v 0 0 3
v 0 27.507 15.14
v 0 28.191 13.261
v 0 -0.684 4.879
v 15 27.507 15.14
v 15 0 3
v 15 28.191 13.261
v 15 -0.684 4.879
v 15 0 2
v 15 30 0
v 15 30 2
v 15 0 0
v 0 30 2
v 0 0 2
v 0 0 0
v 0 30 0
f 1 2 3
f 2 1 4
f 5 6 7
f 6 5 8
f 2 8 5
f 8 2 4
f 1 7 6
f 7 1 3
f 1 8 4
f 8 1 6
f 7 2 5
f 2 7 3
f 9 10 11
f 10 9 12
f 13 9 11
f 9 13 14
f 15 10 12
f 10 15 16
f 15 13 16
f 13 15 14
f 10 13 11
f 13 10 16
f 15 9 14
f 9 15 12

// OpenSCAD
// Create the upper plate
module lowerPlate()
    cube([15,30,2]);
module upperPlate()
    translate([0,0,3])
        rotate([20,0,0])
            lowerPlate();
            
lowerPlate();
upperPlate();





// Join the two plates at the edge
difference() {
  union() {
    upperPlate();
    lowerPlate();
  }
  translate([0,-15,10]) {
    cylinder(r=10, h=40);
  }
}
